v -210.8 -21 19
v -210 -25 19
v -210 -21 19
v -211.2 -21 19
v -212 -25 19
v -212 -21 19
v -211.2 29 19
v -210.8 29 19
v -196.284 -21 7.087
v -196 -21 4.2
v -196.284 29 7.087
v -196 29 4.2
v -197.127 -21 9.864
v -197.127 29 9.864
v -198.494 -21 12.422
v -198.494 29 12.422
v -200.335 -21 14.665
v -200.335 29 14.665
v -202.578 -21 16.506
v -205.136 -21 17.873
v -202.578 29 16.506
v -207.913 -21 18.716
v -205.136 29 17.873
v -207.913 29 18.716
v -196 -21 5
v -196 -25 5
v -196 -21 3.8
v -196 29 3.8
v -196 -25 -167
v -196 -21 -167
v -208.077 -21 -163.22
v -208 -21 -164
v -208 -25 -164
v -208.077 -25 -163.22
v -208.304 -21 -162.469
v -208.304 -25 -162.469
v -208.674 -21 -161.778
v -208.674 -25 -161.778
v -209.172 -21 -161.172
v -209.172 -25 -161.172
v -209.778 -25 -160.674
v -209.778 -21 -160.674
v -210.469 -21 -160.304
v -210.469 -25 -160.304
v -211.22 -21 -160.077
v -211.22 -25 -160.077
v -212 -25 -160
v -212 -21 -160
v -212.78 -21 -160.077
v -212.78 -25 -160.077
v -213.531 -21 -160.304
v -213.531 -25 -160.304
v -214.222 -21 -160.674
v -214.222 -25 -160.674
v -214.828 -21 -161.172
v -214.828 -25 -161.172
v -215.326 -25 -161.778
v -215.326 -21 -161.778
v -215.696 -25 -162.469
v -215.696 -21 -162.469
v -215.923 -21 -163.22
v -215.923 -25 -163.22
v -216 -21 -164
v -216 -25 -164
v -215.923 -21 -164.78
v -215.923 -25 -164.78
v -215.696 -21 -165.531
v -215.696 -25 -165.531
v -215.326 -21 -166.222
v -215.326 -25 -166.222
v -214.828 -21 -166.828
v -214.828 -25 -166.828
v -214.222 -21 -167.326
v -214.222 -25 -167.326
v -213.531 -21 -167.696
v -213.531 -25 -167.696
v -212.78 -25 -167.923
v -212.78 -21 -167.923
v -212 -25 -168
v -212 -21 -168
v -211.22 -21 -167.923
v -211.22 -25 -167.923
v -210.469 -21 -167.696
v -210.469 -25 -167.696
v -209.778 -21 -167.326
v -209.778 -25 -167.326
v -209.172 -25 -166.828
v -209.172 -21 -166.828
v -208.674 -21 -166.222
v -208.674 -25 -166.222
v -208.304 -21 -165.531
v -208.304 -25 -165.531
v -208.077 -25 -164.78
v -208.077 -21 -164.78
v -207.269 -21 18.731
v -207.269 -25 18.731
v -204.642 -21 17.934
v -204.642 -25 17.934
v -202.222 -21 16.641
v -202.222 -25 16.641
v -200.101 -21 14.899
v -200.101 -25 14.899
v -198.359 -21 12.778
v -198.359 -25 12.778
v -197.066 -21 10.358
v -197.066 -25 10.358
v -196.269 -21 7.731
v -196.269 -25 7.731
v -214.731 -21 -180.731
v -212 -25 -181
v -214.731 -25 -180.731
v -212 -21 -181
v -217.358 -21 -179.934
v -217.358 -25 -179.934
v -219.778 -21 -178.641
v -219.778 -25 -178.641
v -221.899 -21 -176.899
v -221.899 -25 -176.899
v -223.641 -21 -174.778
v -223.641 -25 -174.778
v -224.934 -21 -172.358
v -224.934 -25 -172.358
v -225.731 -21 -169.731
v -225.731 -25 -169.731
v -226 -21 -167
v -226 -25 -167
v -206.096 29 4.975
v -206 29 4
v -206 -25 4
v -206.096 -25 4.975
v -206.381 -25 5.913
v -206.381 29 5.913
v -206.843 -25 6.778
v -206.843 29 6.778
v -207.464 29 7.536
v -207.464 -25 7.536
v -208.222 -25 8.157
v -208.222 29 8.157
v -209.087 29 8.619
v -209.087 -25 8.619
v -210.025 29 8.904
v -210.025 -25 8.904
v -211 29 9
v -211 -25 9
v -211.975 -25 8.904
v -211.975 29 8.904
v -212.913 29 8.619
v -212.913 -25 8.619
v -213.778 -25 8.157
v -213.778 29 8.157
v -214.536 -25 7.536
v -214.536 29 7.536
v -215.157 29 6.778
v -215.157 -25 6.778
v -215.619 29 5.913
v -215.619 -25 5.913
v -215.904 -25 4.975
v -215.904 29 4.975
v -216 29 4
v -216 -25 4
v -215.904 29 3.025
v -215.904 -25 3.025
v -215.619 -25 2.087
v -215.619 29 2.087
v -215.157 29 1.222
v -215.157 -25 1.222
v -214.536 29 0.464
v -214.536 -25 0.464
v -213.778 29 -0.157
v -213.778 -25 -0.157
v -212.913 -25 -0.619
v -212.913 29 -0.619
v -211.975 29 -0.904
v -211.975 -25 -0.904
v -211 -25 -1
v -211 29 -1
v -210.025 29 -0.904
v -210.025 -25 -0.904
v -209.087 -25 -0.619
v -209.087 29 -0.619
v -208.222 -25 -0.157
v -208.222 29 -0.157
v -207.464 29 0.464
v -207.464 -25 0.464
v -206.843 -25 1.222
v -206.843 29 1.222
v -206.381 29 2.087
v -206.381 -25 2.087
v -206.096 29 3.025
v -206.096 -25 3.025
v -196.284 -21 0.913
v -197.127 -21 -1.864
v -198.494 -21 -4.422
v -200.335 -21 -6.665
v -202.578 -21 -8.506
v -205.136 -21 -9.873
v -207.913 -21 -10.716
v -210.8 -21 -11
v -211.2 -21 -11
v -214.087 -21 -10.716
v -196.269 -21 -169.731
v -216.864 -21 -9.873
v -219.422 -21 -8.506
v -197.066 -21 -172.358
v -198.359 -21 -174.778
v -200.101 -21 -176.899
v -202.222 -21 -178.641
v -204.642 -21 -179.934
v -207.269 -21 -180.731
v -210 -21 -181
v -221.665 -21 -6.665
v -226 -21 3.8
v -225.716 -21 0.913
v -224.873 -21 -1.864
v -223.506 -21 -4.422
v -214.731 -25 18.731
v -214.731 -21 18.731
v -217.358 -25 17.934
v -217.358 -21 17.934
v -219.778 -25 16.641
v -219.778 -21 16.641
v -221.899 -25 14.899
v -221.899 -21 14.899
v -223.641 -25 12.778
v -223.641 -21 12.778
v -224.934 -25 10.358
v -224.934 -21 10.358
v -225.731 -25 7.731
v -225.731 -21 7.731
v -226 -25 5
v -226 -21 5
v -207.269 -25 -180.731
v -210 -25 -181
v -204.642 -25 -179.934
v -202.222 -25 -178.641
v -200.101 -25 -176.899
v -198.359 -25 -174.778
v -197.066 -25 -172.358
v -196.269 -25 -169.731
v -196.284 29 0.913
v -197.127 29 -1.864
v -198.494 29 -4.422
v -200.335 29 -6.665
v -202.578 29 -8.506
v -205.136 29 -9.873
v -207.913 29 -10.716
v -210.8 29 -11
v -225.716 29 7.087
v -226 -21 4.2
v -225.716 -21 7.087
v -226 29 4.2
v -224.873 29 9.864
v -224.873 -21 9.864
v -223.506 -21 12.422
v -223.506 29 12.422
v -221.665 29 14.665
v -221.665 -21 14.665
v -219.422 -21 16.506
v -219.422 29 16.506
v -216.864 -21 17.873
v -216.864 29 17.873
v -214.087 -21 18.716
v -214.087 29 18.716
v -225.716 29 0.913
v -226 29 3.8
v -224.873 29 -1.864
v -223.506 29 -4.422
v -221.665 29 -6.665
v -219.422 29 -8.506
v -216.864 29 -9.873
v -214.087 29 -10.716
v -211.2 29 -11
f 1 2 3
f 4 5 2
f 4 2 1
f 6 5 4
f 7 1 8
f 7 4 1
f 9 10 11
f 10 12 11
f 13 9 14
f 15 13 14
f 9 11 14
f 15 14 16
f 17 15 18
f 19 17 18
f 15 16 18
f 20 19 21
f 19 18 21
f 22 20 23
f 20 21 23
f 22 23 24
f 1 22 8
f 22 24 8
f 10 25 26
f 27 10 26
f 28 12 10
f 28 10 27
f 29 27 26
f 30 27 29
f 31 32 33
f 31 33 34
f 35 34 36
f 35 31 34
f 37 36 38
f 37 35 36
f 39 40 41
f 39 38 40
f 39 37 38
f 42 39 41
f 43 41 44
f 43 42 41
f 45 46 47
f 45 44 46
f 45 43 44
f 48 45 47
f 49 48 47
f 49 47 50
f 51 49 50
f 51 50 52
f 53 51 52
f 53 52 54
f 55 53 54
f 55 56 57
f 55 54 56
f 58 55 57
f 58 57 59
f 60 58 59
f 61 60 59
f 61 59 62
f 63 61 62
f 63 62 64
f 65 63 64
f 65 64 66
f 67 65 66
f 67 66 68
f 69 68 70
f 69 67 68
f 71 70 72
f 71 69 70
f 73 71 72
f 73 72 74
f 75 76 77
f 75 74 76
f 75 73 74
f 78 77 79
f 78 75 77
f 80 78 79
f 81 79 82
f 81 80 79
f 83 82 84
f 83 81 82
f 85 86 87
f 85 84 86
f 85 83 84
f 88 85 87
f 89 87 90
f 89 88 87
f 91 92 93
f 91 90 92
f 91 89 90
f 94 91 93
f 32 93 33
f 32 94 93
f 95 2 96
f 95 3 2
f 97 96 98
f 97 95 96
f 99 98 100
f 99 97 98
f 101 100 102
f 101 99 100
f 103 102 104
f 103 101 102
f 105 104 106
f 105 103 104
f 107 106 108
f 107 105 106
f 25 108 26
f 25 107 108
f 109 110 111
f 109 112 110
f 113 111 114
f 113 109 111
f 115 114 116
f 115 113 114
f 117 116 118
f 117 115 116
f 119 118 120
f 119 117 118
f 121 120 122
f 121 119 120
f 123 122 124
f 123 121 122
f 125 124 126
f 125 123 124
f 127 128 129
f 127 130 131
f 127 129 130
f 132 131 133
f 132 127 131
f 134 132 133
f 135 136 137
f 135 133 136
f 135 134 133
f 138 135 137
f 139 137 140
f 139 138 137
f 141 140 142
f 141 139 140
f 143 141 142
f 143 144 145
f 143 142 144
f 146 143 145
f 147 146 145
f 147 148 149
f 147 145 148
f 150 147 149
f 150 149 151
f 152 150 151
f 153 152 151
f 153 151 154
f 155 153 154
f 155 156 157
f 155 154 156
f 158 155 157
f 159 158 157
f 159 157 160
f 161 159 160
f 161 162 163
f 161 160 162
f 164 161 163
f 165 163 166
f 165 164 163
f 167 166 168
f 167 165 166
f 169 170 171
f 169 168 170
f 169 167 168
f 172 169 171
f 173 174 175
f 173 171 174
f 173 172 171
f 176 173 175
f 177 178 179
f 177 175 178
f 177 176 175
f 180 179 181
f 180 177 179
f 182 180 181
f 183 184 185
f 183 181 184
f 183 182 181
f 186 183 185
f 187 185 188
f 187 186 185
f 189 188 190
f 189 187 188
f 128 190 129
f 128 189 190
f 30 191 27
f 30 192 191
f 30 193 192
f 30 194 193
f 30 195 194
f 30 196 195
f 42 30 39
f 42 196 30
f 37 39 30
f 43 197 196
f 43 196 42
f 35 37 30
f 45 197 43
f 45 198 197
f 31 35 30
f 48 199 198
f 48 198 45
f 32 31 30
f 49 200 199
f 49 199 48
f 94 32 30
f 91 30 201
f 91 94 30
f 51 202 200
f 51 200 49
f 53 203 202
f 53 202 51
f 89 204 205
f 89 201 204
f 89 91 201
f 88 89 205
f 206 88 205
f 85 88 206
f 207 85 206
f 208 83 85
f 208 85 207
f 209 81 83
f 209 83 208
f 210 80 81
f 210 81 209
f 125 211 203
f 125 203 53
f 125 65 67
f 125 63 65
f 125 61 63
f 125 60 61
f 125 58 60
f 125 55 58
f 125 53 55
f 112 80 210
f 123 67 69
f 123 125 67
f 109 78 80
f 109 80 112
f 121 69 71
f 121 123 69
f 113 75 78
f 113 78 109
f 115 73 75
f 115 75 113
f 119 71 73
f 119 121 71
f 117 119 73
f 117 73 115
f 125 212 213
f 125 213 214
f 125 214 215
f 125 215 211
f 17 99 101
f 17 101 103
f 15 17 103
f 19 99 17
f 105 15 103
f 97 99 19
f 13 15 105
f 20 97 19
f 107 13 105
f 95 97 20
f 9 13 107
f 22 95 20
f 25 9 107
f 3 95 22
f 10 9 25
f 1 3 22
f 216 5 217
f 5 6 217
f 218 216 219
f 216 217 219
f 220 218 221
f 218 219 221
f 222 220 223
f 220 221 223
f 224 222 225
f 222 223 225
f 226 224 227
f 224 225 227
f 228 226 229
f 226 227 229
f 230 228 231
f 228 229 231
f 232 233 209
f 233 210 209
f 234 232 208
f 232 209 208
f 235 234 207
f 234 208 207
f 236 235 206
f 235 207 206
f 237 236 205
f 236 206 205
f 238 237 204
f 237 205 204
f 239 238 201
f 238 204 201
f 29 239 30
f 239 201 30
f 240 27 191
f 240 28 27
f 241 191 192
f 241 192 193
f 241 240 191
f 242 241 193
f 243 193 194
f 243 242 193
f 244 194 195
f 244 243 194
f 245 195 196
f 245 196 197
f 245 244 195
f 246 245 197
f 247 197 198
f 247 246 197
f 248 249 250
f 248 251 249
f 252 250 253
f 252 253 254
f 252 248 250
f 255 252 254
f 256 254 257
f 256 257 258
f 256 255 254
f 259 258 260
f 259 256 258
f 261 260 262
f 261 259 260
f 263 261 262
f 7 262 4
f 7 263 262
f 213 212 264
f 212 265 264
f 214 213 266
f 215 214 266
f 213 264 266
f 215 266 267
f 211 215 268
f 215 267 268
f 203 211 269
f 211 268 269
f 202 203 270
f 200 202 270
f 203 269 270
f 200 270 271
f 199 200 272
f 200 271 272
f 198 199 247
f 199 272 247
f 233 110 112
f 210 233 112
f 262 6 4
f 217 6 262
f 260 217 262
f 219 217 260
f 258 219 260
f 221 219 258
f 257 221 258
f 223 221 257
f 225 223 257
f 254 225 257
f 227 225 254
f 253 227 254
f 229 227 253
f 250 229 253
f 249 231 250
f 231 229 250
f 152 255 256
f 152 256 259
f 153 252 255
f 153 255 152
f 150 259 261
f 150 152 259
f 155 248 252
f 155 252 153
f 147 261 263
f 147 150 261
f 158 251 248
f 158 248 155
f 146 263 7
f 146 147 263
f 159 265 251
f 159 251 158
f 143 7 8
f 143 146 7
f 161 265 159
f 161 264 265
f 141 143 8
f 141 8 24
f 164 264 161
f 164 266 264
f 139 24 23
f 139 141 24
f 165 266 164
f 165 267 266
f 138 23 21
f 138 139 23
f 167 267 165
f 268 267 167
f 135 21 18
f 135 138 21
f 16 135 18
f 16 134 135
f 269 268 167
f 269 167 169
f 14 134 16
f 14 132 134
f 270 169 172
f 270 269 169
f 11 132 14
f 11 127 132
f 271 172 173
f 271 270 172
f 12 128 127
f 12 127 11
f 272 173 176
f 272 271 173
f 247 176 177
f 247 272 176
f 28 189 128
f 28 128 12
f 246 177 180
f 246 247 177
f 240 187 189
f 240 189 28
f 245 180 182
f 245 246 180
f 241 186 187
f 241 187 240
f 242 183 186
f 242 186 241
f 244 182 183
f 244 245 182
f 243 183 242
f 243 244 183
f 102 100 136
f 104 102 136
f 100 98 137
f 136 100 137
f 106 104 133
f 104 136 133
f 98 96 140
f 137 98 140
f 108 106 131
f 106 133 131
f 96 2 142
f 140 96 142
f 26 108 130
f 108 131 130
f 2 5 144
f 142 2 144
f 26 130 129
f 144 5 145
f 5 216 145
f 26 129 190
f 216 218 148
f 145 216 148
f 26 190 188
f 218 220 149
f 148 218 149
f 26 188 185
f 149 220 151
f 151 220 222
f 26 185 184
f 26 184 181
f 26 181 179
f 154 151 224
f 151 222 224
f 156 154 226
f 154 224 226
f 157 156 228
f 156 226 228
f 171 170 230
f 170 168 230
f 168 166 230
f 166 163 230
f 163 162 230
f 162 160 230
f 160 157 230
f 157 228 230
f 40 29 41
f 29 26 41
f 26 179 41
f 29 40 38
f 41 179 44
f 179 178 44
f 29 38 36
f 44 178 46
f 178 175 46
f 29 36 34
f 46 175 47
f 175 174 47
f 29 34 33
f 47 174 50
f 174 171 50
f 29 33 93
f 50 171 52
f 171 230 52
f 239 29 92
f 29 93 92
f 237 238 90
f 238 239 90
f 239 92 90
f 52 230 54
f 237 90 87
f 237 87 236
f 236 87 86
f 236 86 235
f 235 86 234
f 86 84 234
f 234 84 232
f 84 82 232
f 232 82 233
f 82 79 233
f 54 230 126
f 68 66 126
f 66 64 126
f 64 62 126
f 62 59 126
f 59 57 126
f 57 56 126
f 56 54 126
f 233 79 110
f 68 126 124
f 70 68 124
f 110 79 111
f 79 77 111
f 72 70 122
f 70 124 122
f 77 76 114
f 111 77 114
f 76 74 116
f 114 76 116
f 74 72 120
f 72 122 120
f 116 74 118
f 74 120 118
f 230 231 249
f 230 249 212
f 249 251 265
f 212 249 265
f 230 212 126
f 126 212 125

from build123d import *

# Parameters (mm, degrees)
CYLINDER015_R          = 4
CYLINDER015_DEPTH      = 20
CYLINDER015_ROLL_ANGLE = 90
CYLINDER011_R          = 5
CYLINDER011_DEPTH      = 70
CYLINDER011_ROLL_ANGLE = 90
BOX015_W               = 30
BOX015_H               = 50
BOX015_DEPTH           = 30
FILLET011_R            = 14.8
BOX014_W               = 200
BOX014_H               = 4
BOX014_DEPTH           = 30
BOX014_PITCH_ANGLE     = 90
FILLET010_R            = 14


with BuildPart() as cylindre015:
    # Cylinder015 → Cylinder015 (new body)
    with BuildSketch(Plane.XY):
        Circle(CYLINDER015_R)
    extrude(amount=CYLINDER015_DEPTH)


with BuildPart() as cylindre015_1:
    # Cylinder015 roll: moved
    add(cylindre015.part.rotate(Axis((0, 0, 0), (1, 0, 0)), CYLINDER015_ROLL_ANGLE))


with BuildPart() as cylindre015_2:
    # Cylinder015 placement: moved
    add(cylindre015_1.part.moved(Location((-212, -10, -164))))


with BuildPart() as cylindre011:
    # Cylinder011 → Cylinder011 (new body)
    with BuildSketch(Plane.XY):
        Circle(CYLINDER011_R)
    extrude(amount=CYLINDER011_DEPTH)


with BuildPart() as cylindre011_1:
    # Cylinder011 roll: moved
    add(cylindre011.part.rotate(Axis((0, 0, 0), (1, 0, 0)), CYLINDER011_ROLL_ANGLE))


with BuildPart() as cylindre011_2:
    # Cylinder011 placement: moved
    add(cylindre011_1.part.moved(Location((-210, 37, 4))))


with BuildPart() as fillet011:
    # Box015 → Box015 (new body)
    with BuildSketch(Plane(origin=(-225, -21, -11), x_dir=(1, 0, 0), z_dir=(0, 0, 1))):
        with Locations((15, 25)):
            Rectangle(BOX015_W, BOX015_H)
    extrude(amount=BOX015_DEPTH)

    # Fillet011
    fillet011_edges = [fillet011.edges().sort_by_distance(p)[0] for p in [
        (-225, 4, 19),
        (-225, 4, -11),
        (-195, 4, 19),
        (-195, 4, -11),
    ]]
    fillet(fillet011_edges, radius=FILLET011_R)


with BuildPart() as cut020:
    # Box014 → Box014 (new body)
    with BuildSketch(Plane.XY):
        with Locations((100, 2)):
            Rectangle(BOX014_W, BOX014_H)
    extrude(amount=BOX014_DEPTH)


with BuildPart() as cut020_1:
    # Box014 pitch: moved
    add(cut020.part.rotate(Axis((0, 0, 0), (0, 1, 0)), BOX014_PITCH_ANGLE))


with BuildPart() as cut020_2:
    # Box014 placement: moved
    add(cut020_1.part.moved(Location((-225, -25, 18))))

    # Fillet010
    fillet010_edges = [cut020_2.edges().sort_by_distance(p)[0] for p in [
        (-195, -23, 18),
        (-225, -23, 18),
        (-195, -23, -182),
        (-225, -23, -182),
    ]]
    fillet(fillet010_edges, radius=FILLET010_R)


with BuildPart() as cut020_3:
    # Fillet010 placement: moved
    add(cut020_2.part.moved(Location((0, 0, 1))))

    # Fusion009: union Fillet011
    add(fillet011.part)

    # Cut016: cut Cylindre011
    add(cylindre011_2.part, mode=Mode.SUBTRACT)


with BuildPart() as cut020_4:
    # Cut016 placement: moved
    add(cut020_3.part.moved(Location((-1, 0, 0))))

    # Cut020: cut Cylindre015
    add(cylindre015_2.part, mode=Mode.SUBTRACT)


solid = cut020_4.part
